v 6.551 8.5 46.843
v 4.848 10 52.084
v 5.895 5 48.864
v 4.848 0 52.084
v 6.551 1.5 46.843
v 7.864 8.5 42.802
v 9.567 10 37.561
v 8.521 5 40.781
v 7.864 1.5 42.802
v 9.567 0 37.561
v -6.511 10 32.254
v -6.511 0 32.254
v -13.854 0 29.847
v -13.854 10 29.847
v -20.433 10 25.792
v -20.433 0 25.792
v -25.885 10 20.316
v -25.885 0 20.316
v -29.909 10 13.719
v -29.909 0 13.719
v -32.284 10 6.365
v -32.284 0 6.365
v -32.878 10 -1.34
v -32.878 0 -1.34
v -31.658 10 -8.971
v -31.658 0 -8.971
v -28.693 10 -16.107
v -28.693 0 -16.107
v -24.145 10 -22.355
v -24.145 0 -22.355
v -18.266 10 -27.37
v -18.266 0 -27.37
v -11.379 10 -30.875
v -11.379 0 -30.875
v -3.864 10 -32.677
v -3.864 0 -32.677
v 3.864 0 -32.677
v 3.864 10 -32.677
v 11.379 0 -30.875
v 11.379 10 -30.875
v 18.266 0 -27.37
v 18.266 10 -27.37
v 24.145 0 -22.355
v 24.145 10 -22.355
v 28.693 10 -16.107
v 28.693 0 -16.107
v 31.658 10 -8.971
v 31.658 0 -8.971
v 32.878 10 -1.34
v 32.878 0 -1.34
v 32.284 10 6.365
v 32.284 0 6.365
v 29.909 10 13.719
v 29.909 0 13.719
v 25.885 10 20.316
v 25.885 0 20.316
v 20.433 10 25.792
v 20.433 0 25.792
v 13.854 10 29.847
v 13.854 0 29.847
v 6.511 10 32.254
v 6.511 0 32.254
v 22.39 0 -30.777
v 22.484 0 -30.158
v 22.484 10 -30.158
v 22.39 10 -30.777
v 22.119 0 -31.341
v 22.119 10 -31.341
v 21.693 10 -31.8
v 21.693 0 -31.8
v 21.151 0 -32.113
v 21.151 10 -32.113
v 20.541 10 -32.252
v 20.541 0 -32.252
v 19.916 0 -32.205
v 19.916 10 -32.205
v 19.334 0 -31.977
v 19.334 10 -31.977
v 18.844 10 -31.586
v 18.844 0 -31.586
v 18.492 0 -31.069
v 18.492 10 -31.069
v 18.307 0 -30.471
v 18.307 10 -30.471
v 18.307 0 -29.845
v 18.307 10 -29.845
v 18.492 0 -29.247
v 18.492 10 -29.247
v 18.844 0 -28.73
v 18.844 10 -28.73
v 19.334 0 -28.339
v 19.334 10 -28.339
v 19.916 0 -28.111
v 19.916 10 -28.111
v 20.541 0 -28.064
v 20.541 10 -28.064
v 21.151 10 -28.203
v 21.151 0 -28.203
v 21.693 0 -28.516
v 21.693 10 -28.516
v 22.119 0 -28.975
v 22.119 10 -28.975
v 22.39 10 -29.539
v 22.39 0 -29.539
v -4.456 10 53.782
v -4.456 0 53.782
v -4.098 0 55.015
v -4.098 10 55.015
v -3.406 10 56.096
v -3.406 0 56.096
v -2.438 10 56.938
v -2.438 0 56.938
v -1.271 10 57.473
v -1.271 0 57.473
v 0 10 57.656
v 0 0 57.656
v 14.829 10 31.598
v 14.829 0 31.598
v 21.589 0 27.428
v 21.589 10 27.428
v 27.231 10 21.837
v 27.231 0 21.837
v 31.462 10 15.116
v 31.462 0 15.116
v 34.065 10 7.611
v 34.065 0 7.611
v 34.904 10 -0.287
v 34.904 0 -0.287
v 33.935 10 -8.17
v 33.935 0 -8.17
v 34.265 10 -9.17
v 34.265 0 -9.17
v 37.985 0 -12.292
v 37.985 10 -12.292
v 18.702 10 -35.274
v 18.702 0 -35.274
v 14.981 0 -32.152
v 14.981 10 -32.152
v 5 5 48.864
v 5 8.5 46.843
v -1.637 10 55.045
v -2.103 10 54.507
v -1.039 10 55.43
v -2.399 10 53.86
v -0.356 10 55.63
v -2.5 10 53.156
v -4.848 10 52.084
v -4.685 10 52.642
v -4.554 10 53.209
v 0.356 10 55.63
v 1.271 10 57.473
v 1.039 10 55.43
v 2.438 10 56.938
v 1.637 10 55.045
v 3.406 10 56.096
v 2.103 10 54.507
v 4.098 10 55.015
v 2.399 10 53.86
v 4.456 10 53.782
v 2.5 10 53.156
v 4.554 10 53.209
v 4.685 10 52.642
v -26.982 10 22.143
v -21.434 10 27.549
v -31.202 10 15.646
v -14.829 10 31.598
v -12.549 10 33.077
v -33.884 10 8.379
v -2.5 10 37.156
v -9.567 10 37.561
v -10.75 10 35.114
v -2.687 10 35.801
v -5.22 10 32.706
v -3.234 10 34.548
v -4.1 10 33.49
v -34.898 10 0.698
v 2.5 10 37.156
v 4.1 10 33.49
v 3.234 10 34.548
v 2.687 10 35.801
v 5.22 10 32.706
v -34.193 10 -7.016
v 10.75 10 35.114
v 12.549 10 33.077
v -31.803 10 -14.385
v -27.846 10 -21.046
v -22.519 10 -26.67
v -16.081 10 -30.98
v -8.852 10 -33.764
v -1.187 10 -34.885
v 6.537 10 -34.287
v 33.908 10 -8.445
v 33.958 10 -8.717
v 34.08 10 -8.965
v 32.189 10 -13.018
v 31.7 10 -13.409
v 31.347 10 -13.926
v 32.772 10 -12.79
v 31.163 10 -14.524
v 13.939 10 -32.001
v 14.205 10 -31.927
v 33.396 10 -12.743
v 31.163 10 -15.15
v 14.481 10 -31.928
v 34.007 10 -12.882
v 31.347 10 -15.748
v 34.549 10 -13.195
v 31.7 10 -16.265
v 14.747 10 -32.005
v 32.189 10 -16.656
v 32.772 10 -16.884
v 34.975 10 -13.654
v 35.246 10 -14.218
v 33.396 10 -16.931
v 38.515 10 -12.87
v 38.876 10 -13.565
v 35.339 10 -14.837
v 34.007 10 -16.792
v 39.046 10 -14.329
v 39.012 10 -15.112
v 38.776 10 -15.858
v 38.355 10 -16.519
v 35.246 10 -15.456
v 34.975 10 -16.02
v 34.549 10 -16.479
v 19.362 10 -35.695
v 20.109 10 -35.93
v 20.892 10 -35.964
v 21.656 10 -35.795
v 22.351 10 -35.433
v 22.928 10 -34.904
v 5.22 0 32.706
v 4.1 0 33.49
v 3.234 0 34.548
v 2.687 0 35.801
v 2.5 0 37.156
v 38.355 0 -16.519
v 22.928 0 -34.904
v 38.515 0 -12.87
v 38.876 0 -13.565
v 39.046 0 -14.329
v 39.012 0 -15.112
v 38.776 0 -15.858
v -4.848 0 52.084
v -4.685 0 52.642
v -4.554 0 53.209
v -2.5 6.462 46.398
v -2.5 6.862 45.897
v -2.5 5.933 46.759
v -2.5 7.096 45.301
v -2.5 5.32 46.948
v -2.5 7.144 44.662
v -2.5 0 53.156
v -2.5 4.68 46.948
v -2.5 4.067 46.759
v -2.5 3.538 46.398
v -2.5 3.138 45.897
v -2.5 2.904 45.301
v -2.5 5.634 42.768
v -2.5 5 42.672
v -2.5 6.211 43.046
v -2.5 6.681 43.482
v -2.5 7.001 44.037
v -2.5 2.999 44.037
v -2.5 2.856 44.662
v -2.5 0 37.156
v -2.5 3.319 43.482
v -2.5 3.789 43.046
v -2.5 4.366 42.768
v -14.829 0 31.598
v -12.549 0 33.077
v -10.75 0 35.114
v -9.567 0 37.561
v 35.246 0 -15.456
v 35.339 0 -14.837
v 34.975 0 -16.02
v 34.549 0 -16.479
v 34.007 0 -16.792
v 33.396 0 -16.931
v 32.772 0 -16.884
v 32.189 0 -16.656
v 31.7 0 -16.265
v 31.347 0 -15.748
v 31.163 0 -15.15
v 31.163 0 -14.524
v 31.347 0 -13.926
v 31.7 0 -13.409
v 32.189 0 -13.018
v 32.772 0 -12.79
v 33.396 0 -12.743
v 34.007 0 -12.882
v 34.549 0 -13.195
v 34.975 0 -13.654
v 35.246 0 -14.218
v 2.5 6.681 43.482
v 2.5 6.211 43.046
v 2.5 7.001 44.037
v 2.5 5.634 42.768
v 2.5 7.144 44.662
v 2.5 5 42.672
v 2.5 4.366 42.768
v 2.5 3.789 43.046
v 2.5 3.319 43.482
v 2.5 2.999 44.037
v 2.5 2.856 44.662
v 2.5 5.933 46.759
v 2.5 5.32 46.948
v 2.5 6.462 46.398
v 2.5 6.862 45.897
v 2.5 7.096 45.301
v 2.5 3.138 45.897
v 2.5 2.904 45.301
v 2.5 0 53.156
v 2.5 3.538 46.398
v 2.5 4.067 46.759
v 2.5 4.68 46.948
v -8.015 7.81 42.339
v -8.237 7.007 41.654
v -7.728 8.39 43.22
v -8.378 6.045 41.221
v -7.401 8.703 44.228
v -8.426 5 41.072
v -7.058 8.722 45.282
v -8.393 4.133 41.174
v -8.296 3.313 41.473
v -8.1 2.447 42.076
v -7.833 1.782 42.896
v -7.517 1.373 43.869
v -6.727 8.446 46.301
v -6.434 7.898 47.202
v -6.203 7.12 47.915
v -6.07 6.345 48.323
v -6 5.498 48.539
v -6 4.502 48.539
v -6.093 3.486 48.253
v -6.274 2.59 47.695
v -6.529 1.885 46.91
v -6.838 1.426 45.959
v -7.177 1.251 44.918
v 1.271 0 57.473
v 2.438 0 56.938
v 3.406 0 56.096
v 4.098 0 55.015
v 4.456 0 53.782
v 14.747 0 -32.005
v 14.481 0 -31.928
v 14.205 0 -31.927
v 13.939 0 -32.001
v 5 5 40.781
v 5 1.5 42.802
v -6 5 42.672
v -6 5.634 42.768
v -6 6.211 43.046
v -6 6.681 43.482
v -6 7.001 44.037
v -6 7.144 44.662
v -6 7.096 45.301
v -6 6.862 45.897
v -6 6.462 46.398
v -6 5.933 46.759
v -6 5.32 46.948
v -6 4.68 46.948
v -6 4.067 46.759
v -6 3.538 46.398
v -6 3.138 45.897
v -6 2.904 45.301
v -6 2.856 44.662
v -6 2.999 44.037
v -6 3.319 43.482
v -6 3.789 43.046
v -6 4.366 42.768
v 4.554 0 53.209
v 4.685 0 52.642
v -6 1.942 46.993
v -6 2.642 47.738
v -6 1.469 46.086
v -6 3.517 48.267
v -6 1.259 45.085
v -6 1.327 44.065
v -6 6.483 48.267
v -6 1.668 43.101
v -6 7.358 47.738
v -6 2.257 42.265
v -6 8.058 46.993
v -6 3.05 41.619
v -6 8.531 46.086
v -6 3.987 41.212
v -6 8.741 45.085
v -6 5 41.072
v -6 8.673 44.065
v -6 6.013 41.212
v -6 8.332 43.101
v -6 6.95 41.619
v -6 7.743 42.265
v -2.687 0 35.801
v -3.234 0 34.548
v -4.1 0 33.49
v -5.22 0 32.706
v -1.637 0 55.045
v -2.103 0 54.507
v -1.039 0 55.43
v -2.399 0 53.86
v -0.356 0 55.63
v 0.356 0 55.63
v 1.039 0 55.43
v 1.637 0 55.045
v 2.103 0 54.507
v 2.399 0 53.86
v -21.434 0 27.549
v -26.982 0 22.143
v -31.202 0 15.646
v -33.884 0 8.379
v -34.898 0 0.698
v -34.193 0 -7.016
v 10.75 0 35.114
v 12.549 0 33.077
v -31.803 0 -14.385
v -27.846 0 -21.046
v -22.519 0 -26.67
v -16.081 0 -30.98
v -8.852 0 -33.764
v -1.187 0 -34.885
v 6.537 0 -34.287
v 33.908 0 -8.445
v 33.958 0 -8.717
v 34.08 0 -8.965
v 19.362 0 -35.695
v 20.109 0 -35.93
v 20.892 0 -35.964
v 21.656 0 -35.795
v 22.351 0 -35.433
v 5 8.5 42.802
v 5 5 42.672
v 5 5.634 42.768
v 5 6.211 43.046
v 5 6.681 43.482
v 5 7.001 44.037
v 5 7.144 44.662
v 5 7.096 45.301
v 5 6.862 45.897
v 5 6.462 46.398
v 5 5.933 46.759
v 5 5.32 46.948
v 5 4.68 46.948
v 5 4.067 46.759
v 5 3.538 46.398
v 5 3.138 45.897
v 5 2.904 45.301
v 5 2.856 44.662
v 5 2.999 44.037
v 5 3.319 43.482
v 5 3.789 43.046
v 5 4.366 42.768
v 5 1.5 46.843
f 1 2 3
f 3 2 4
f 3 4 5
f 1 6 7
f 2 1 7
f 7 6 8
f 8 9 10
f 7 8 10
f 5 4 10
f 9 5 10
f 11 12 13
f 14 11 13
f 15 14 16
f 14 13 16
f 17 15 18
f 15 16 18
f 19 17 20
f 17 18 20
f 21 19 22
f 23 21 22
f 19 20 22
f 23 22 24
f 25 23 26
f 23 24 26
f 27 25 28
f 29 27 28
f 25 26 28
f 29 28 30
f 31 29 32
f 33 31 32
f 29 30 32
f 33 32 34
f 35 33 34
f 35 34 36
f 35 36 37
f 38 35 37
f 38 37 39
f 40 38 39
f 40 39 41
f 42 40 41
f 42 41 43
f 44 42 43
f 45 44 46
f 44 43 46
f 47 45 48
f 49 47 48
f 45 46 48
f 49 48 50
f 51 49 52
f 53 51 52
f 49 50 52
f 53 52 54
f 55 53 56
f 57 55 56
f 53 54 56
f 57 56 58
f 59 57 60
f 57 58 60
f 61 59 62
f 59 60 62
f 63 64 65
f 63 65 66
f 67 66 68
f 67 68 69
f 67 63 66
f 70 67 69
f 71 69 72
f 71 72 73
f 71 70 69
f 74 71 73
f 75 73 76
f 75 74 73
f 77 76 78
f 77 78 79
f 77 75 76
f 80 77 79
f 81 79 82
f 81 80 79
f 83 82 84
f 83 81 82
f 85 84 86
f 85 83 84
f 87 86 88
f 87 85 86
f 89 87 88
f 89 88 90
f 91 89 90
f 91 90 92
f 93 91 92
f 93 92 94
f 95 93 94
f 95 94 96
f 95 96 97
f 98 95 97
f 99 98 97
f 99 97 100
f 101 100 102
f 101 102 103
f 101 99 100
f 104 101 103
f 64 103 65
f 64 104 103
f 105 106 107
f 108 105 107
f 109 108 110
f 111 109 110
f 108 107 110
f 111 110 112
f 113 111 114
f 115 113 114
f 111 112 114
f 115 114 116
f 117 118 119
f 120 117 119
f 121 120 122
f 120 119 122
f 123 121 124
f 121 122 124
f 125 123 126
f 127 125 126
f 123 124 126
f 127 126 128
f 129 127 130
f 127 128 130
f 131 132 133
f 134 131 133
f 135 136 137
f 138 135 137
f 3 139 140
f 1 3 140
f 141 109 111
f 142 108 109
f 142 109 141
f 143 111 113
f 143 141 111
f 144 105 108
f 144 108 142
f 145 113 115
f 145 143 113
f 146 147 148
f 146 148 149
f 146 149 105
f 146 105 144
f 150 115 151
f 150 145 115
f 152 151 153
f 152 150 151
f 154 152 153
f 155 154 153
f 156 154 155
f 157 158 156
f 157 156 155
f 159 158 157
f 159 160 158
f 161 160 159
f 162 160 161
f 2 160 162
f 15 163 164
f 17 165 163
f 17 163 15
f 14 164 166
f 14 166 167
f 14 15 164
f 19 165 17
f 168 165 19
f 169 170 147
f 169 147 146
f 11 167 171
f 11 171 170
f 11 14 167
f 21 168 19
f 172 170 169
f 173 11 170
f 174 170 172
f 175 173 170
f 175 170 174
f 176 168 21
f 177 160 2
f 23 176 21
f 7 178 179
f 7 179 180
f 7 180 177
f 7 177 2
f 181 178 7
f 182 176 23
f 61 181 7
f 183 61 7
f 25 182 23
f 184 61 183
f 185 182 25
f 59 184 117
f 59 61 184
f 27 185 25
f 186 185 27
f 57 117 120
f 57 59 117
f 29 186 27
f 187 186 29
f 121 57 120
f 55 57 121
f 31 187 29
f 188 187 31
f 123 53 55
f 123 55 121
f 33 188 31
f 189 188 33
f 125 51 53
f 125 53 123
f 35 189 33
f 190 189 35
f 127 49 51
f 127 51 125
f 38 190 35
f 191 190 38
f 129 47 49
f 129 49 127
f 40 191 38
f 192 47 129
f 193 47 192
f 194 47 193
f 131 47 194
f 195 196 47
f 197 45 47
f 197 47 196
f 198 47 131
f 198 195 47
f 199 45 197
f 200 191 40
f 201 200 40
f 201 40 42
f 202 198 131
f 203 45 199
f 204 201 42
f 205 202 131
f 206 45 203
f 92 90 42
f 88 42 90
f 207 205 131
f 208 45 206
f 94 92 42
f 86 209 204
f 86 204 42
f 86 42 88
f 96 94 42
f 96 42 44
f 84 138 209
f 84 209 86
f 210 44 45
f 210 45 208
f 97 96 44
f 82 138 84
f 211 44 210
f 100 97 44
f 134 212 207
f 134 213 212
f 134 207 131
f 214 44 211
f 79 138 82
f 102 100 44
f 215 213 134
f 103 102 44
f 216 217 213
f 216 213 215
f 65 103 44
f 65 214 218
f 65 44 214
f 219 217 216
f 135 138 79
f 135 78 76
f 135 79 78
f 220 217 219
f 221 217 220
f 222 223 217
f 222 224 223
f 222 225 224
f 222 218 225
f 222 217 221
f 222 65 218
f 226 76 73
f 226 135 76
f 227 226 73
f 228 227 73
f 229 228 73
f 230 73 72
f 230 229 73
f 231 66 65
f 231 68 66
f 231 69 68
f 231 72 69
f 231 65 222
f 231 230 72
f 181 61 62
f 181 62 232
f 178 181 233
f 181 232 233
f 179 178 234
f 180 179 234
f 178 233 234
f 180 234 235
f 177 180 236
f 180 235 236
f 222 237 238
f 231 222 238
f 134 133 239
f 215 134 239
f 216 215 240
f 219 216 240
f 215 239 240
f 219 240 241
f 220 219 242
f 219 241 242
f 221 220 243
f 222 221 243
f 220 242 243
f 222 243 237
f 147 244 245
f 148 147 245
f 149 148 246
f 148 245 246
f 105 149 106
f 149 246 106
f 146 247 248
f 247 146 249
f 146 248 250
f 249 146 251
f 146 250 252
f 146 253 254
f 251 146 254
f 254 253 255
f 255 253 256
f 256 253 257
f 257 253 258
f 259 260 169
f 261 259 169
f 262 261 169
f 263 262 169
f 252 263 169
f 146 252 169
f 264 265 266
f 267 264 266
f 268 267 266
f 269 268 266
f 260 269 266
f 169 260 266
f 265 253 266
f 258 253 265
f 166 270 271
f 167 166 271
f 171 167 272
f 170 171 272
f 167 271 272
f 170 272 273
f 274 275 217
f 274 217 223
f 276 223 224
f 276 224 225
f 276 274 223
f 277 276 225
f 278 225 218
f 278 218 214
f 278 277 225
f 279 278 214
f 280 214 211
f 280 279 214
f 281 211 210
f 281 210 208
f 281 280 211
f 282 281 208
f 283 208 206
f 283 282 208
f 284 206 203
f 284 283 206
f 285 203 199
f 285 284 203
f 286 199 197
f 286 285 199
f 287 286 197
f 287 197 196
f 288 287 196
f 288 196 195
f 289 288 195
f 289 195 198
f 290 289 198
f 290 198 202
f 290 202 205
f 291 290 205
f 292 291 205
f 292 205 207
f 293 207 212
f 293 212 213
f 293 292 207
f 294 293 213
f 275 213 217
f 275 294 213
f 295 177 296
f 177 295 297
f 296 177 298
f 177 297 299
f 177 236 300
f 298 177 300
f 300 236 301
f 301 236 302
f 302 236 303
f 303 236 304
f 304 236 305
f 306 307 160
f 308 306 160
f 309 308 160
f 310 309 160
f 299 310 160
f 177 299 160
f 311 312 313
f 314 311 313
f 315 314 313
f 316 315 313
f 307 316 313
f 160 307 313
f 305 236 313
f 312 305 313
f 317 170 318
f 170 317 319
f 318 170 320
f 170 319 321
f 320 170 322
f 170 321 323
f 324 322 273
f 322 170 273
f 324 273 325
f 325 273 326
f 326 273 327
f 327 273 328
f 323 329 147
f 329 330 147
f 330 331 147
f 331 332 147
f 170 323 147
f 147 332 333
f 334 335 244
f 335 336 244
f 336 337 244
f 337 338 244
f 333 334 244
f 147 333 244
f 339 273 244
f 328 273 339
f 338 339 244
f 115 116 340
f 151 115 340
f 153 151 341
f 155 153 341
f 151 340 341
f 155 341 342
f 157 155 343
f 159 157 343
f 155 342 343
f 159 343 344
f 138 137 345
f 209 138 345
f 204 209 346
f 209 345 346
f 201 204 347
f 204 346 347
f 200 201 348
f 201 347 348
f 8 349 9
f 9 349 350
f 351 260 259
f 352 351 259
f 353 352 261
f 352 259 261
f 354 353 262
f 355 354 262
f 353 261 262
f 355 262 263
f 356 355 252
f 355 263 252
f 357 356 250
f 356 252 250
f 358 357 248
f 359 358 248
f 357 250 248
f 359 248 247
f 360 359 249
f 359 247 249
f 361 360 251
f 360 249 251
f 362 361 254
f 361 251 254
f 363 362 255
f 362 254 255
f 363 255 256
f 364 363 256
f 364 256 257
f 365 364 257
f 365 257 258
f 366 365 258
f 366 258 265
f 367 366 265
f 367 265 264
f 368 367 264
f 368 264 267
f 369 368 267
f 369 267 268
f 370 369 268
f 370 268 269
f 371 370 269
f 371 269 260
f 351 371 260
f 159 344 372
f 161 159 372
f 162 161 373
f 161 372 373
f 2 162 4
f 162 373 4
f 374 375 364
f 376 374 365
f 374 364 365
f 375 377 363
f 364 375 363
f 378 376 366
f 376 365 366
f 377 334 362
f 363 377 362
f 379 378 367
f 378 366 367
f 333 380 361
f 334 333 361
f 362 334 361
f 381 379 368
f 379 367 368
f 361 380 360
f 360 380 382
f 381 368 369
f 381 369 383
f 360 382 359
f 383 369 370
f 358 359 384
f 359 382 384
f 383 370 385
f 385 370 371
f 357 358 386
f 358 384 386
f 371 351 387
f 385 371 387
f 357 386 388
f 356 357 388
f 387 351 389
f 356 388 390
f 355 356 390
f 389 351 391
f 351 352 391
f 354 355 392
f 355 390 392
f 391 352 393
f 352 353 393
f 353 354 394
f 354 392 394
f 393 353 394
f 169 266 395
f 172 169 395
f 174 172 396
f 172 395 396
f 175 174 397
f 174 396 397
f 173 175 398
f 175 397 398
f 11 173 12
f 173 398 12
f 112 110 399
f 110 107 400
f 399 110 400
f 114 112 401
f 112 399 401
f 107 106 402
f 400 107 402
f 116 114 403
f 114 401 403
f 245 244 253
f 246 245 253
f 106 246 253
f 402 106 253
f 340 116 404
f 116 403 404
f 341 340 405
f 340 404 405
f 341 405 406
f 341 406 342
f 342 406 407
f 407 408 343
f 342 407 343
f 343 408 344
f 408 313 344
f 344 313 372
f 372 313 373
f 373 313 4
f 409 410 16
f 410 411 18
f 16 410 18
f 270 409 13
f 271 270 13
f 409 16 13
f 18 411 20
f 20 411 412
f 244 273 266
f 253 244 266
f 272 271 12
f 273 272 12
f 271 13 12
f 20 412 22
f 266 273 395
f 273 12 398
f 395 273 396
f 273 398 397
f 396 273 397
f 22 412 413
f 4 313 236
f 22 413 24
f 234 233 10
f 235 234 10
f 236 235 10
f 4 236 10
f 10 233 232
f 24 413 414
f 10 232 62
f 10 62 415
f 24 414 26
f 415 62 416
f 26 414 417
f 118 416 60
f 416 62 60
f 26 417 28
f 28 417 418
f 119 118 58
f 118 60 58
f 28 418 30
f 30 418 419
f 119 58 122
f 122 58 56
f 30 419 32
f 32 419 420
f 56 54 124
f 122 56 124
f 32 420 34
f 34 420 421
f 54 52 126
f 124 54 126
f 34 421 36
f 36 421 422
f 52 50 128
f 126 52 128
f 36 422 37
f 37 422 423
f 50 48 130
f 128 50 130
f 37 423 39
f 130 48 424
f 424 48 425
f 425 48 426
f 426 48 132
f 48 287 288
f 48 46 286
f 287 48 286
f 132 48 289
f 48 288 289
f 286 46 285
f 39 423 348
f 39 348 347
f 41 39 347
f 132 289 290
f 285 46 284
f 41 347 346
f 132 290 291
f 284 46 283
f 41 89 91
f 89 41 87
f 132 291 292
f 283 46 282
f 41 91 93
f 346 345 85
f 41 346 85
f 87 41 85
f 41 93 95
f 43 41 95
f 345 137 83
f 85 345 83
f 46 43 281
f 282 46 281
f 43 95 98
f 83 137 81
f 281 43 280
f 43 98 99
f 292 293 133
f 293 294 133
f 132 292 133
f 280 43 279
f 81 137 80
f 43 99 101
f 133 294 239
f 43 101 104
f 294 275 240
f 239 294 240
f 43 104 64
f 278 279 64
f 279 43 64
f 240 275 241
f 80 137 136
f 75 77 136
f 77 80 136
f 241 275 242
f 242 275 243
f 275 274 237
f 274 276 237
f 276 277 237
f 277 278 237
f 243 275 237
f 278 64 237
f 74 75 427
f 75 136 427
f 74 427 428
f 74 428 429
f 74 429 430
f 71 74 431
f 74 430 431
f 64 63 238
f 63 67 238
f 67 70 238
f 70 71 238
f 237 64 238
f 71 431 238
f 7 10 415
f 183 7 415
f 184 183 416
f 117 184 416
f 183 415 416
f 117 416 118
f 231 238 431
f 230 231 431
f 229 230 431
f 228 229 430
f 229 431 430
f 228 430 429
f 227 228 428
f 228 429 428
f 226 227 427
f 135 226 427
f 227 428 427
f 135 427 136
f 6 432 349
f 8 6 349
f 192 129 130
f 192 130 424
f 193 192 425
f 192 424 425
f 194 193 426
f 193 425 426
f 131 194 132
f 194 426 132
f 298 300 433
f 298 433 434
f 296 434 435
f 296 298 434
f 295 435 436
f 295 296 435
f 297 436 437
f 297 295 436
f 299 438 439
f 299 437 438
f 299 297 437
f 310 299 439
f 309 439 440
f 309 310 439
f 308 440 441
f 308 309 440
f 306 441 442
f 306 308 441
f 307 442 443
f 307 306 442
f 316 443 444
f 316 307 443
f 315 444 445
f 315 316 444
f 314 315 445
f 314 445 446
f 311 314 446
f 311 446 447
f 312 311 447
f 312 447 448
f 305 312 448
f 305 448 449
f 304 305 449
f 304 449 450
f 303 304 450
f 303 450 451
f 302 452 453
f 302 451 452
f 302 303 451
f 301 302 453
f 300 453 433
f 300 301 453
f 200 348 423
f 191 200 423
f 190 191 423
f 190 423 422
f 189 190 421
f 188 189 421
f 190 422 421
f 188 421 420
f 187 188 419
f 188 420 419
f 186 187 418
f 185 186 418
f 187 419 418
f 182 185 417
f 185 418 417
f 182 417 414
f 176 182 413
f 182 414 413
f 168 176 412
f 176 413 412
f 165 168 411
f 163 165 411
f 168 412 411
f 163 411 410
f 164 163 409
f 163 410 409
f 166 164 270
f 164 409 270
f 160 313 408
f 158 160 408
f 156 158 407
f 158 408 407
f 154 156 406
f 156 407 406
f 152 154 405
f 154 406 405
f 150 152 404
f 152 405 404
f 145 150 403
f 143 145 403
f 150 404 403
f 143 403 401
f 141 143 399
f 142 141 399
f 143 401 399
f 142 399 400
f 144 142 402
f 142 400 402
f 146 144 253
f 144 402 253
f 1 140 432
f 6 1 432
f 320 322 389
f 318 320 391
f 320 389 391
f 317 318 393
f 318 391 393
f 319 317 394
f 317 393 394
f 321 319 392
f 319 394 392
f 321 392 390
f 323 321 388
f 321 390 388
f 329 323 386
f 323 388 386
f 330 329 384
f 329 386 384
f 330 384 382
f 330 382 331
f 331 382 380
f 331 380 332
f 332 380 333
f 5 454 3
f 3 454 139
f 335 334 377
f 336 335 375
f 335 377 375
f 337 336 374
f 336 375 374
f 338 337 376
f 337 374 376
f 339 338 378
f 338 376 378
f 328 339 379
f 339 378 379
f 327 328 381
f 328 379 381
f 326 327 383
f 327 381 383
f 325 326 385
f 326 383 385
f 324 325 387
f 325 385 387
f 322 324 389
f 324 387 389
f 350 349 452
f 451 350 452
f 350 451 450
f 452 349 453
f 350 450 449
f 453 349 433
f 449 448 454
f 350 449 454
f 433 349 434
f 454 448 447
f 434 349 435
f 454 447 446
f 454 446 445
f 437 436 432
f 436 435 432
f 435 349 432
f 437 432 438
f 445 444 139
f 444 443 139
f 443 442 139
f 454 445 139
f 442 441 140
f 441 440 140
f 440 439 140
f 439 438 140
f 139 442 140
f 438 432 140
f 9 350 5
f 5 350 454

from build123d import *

# Parameters (mm, degrees)
SKETCH1_R               = 2.1
BOSS_EXTRUDE1_DEPTH     = 10
SKETCH3_R               = 2.15
CUT_EXTRUDE1_DEPTH      = 10
CUT_EXTRUDE1_DEPTH_BACK = 10
CUT_EXTRUDE2_START      = -6
SKETCH4_R               = 3.75
CUT_EXTRUDE2_DEPTH      = 10
CUT_EXTRUDE3_START      = -2.5
CUT_EXTRUDE3_DEPTH      = 10


with BuildPart() as part:
    # Sketch1 → Boss-Extrude1 (new body)
    with BuildSketch(Plane(origin=(0, 0, 0), x_dir=(1, 0, 0), z_dir=(0, 1, 0))):
        with BuildLine():
            Line((38.355229041, 16.51897107), (22.928326409, 34.904037705))
            ThreePointArc((22.928326409, 34.904037705), (20.891660307, 35.96425897), (18.70183025, 35.273808205))
            Line((18.70183025, 35.273808205), (14.981111589, 32.151754549))
            ThreePointArc((14.981111589, 32.151754549), (14.481497375, 31.928101372), (13.938983386, 32.000996346))
            ThreePointArc((13.938983386, 32.000996346), (-31.802778701, 14.385488935), (-14.829176591, -31.59833139))
            ThreePointArc((-14.829176591, -31.59833139), (-11.579923366, -34.034003552), (-9.567050503, -37.560827652))
            Line((-9.567050503, -37.560827652), (-4.848288245, -52.083684568))
            ThreePointArc((-4.848288245, -52.083684568), (-4.61517148, -52.924262884), (-4.456195885, -53.781958687))
            ThreePointArc((-4.456195885, -53.781958687), (-2.952237368, -56.551823245), (0, -57.655605566))
            ThreePointArc((0, -57.655605566), (2.952237368, -56.551823245), (4.456195885, -53.781958687))
            ThreePointArc((4.456195885, -53.781958687), (4.61517148, -52.924262884), (4.848288245, -52.083684568))
            Line((4.848288245, -52.083684568), (9.567050503, -37.560827652))
            ThreePointArc((9.567050503, -37.560827652), (11.579923366, -34.034003552), (14.829176591, -31.59833139))
            ThreePointArc((14.829176591, -31.59833139), (31.462355963, -15.115527853), (33.935308369, 8.170304209))
            ThreePointArc((33.935308369, 8.170304209), (33.957727399, 8.717234271), (34.264739879, 9.170421255))
            Line((34.264739879, 9.170421255), (37.985458541, 12.292474912))
            ThreePointArc((37.985458541, 12.292474912), (39.045679806, 14.329141013), (38.355229041, 16.51897107))
        make_face()
        with BuildLine():
            Line((-2.5, -53.155605566), (-2.5, -37.155605566))
            ThreePointArc((-2.5, -37.155605566), (-3.630466632, -33.989107261), (-6.510684606, -32.254457226))
            ThreePointArc((-6.510684606, -32.254457226), (0, 32.905), (6.510684606, -32.254457226))
            ThreePointArc((6.510684606, -32.254457226), (3.630466632, -33.989107261), (2.5, -37.155605566))
            Line((2.5, -37.155605566), (2.5, -53.155605566))
            ThreePointArc((2.5, -53.155605566), (0, -55.655605566), (-2.5, -53.155605566))
        make_face(mode=Mode.SUBTRACT)
        with Locations((20.383679412, 30.15801077)):
            Circle(SKETCH1_R, mode=Mode.SUBTRACT)
        with Locations((33.239431606, 14.837121908)):
            Circle(SKETCH1_R, mode=Mode.SUBTRACT)
    extrude(amount=BOSS_EXTRUDE1_DEPTH)

    # Sketch3 → Cut-Extrude1 (cut, two sides)
    with BuildSketch(Plane(origin=(0, 0, 0), x_dir=(0, 0, -1), z_dir=(1, 0, 0))) as cut_extrude1_sk:
        with Locations((-44.82225611, 5)):
            Circle(SKETCH3_R)
    extrude(amount=CUT_EXTRUDE1_DEPTH, mode=Mode.SUBTRACT)
    extrude(cut_extrude1_sk.sketch, amount=-CUT_EXTRUDE1_DEPTH_BACK, mode=Mode.SUBTRACT)

    # Sketch4 → Cut-Extrude2 (cut)
    with BuildSketch(Plane(origin=(0, 0, 0), x_dir=(0, 0, -1), z_dir=(1, 0, 0)).offset(CUT_EXTRUDE2_START)):
        with Locations((-44.82225611, 5)):
            Circle(SKETCH4_R)
    extrude(amount=-CUT_EXTRUDE2_DEPTH, mode=Mode.SUBTRACT)

    # Sketch5 → Cut-Extrude3 (cut)
    with BuildSketch(Plane.ZY.offset(-2.5).offset(CUT_EXTRUDE3_START)):
        Polygon((46.842982052, 8.5), (42.801530168, 8.5), (40.780804226, 5), (42.801530168, 1.5), (46.842982052, 1.5), (48.863707994, 5), align=None)
    extrude(amount=-CUT_EXTRUDE3_DEPTH, mode=Mode.SUBTRACT)


solid = part.part
